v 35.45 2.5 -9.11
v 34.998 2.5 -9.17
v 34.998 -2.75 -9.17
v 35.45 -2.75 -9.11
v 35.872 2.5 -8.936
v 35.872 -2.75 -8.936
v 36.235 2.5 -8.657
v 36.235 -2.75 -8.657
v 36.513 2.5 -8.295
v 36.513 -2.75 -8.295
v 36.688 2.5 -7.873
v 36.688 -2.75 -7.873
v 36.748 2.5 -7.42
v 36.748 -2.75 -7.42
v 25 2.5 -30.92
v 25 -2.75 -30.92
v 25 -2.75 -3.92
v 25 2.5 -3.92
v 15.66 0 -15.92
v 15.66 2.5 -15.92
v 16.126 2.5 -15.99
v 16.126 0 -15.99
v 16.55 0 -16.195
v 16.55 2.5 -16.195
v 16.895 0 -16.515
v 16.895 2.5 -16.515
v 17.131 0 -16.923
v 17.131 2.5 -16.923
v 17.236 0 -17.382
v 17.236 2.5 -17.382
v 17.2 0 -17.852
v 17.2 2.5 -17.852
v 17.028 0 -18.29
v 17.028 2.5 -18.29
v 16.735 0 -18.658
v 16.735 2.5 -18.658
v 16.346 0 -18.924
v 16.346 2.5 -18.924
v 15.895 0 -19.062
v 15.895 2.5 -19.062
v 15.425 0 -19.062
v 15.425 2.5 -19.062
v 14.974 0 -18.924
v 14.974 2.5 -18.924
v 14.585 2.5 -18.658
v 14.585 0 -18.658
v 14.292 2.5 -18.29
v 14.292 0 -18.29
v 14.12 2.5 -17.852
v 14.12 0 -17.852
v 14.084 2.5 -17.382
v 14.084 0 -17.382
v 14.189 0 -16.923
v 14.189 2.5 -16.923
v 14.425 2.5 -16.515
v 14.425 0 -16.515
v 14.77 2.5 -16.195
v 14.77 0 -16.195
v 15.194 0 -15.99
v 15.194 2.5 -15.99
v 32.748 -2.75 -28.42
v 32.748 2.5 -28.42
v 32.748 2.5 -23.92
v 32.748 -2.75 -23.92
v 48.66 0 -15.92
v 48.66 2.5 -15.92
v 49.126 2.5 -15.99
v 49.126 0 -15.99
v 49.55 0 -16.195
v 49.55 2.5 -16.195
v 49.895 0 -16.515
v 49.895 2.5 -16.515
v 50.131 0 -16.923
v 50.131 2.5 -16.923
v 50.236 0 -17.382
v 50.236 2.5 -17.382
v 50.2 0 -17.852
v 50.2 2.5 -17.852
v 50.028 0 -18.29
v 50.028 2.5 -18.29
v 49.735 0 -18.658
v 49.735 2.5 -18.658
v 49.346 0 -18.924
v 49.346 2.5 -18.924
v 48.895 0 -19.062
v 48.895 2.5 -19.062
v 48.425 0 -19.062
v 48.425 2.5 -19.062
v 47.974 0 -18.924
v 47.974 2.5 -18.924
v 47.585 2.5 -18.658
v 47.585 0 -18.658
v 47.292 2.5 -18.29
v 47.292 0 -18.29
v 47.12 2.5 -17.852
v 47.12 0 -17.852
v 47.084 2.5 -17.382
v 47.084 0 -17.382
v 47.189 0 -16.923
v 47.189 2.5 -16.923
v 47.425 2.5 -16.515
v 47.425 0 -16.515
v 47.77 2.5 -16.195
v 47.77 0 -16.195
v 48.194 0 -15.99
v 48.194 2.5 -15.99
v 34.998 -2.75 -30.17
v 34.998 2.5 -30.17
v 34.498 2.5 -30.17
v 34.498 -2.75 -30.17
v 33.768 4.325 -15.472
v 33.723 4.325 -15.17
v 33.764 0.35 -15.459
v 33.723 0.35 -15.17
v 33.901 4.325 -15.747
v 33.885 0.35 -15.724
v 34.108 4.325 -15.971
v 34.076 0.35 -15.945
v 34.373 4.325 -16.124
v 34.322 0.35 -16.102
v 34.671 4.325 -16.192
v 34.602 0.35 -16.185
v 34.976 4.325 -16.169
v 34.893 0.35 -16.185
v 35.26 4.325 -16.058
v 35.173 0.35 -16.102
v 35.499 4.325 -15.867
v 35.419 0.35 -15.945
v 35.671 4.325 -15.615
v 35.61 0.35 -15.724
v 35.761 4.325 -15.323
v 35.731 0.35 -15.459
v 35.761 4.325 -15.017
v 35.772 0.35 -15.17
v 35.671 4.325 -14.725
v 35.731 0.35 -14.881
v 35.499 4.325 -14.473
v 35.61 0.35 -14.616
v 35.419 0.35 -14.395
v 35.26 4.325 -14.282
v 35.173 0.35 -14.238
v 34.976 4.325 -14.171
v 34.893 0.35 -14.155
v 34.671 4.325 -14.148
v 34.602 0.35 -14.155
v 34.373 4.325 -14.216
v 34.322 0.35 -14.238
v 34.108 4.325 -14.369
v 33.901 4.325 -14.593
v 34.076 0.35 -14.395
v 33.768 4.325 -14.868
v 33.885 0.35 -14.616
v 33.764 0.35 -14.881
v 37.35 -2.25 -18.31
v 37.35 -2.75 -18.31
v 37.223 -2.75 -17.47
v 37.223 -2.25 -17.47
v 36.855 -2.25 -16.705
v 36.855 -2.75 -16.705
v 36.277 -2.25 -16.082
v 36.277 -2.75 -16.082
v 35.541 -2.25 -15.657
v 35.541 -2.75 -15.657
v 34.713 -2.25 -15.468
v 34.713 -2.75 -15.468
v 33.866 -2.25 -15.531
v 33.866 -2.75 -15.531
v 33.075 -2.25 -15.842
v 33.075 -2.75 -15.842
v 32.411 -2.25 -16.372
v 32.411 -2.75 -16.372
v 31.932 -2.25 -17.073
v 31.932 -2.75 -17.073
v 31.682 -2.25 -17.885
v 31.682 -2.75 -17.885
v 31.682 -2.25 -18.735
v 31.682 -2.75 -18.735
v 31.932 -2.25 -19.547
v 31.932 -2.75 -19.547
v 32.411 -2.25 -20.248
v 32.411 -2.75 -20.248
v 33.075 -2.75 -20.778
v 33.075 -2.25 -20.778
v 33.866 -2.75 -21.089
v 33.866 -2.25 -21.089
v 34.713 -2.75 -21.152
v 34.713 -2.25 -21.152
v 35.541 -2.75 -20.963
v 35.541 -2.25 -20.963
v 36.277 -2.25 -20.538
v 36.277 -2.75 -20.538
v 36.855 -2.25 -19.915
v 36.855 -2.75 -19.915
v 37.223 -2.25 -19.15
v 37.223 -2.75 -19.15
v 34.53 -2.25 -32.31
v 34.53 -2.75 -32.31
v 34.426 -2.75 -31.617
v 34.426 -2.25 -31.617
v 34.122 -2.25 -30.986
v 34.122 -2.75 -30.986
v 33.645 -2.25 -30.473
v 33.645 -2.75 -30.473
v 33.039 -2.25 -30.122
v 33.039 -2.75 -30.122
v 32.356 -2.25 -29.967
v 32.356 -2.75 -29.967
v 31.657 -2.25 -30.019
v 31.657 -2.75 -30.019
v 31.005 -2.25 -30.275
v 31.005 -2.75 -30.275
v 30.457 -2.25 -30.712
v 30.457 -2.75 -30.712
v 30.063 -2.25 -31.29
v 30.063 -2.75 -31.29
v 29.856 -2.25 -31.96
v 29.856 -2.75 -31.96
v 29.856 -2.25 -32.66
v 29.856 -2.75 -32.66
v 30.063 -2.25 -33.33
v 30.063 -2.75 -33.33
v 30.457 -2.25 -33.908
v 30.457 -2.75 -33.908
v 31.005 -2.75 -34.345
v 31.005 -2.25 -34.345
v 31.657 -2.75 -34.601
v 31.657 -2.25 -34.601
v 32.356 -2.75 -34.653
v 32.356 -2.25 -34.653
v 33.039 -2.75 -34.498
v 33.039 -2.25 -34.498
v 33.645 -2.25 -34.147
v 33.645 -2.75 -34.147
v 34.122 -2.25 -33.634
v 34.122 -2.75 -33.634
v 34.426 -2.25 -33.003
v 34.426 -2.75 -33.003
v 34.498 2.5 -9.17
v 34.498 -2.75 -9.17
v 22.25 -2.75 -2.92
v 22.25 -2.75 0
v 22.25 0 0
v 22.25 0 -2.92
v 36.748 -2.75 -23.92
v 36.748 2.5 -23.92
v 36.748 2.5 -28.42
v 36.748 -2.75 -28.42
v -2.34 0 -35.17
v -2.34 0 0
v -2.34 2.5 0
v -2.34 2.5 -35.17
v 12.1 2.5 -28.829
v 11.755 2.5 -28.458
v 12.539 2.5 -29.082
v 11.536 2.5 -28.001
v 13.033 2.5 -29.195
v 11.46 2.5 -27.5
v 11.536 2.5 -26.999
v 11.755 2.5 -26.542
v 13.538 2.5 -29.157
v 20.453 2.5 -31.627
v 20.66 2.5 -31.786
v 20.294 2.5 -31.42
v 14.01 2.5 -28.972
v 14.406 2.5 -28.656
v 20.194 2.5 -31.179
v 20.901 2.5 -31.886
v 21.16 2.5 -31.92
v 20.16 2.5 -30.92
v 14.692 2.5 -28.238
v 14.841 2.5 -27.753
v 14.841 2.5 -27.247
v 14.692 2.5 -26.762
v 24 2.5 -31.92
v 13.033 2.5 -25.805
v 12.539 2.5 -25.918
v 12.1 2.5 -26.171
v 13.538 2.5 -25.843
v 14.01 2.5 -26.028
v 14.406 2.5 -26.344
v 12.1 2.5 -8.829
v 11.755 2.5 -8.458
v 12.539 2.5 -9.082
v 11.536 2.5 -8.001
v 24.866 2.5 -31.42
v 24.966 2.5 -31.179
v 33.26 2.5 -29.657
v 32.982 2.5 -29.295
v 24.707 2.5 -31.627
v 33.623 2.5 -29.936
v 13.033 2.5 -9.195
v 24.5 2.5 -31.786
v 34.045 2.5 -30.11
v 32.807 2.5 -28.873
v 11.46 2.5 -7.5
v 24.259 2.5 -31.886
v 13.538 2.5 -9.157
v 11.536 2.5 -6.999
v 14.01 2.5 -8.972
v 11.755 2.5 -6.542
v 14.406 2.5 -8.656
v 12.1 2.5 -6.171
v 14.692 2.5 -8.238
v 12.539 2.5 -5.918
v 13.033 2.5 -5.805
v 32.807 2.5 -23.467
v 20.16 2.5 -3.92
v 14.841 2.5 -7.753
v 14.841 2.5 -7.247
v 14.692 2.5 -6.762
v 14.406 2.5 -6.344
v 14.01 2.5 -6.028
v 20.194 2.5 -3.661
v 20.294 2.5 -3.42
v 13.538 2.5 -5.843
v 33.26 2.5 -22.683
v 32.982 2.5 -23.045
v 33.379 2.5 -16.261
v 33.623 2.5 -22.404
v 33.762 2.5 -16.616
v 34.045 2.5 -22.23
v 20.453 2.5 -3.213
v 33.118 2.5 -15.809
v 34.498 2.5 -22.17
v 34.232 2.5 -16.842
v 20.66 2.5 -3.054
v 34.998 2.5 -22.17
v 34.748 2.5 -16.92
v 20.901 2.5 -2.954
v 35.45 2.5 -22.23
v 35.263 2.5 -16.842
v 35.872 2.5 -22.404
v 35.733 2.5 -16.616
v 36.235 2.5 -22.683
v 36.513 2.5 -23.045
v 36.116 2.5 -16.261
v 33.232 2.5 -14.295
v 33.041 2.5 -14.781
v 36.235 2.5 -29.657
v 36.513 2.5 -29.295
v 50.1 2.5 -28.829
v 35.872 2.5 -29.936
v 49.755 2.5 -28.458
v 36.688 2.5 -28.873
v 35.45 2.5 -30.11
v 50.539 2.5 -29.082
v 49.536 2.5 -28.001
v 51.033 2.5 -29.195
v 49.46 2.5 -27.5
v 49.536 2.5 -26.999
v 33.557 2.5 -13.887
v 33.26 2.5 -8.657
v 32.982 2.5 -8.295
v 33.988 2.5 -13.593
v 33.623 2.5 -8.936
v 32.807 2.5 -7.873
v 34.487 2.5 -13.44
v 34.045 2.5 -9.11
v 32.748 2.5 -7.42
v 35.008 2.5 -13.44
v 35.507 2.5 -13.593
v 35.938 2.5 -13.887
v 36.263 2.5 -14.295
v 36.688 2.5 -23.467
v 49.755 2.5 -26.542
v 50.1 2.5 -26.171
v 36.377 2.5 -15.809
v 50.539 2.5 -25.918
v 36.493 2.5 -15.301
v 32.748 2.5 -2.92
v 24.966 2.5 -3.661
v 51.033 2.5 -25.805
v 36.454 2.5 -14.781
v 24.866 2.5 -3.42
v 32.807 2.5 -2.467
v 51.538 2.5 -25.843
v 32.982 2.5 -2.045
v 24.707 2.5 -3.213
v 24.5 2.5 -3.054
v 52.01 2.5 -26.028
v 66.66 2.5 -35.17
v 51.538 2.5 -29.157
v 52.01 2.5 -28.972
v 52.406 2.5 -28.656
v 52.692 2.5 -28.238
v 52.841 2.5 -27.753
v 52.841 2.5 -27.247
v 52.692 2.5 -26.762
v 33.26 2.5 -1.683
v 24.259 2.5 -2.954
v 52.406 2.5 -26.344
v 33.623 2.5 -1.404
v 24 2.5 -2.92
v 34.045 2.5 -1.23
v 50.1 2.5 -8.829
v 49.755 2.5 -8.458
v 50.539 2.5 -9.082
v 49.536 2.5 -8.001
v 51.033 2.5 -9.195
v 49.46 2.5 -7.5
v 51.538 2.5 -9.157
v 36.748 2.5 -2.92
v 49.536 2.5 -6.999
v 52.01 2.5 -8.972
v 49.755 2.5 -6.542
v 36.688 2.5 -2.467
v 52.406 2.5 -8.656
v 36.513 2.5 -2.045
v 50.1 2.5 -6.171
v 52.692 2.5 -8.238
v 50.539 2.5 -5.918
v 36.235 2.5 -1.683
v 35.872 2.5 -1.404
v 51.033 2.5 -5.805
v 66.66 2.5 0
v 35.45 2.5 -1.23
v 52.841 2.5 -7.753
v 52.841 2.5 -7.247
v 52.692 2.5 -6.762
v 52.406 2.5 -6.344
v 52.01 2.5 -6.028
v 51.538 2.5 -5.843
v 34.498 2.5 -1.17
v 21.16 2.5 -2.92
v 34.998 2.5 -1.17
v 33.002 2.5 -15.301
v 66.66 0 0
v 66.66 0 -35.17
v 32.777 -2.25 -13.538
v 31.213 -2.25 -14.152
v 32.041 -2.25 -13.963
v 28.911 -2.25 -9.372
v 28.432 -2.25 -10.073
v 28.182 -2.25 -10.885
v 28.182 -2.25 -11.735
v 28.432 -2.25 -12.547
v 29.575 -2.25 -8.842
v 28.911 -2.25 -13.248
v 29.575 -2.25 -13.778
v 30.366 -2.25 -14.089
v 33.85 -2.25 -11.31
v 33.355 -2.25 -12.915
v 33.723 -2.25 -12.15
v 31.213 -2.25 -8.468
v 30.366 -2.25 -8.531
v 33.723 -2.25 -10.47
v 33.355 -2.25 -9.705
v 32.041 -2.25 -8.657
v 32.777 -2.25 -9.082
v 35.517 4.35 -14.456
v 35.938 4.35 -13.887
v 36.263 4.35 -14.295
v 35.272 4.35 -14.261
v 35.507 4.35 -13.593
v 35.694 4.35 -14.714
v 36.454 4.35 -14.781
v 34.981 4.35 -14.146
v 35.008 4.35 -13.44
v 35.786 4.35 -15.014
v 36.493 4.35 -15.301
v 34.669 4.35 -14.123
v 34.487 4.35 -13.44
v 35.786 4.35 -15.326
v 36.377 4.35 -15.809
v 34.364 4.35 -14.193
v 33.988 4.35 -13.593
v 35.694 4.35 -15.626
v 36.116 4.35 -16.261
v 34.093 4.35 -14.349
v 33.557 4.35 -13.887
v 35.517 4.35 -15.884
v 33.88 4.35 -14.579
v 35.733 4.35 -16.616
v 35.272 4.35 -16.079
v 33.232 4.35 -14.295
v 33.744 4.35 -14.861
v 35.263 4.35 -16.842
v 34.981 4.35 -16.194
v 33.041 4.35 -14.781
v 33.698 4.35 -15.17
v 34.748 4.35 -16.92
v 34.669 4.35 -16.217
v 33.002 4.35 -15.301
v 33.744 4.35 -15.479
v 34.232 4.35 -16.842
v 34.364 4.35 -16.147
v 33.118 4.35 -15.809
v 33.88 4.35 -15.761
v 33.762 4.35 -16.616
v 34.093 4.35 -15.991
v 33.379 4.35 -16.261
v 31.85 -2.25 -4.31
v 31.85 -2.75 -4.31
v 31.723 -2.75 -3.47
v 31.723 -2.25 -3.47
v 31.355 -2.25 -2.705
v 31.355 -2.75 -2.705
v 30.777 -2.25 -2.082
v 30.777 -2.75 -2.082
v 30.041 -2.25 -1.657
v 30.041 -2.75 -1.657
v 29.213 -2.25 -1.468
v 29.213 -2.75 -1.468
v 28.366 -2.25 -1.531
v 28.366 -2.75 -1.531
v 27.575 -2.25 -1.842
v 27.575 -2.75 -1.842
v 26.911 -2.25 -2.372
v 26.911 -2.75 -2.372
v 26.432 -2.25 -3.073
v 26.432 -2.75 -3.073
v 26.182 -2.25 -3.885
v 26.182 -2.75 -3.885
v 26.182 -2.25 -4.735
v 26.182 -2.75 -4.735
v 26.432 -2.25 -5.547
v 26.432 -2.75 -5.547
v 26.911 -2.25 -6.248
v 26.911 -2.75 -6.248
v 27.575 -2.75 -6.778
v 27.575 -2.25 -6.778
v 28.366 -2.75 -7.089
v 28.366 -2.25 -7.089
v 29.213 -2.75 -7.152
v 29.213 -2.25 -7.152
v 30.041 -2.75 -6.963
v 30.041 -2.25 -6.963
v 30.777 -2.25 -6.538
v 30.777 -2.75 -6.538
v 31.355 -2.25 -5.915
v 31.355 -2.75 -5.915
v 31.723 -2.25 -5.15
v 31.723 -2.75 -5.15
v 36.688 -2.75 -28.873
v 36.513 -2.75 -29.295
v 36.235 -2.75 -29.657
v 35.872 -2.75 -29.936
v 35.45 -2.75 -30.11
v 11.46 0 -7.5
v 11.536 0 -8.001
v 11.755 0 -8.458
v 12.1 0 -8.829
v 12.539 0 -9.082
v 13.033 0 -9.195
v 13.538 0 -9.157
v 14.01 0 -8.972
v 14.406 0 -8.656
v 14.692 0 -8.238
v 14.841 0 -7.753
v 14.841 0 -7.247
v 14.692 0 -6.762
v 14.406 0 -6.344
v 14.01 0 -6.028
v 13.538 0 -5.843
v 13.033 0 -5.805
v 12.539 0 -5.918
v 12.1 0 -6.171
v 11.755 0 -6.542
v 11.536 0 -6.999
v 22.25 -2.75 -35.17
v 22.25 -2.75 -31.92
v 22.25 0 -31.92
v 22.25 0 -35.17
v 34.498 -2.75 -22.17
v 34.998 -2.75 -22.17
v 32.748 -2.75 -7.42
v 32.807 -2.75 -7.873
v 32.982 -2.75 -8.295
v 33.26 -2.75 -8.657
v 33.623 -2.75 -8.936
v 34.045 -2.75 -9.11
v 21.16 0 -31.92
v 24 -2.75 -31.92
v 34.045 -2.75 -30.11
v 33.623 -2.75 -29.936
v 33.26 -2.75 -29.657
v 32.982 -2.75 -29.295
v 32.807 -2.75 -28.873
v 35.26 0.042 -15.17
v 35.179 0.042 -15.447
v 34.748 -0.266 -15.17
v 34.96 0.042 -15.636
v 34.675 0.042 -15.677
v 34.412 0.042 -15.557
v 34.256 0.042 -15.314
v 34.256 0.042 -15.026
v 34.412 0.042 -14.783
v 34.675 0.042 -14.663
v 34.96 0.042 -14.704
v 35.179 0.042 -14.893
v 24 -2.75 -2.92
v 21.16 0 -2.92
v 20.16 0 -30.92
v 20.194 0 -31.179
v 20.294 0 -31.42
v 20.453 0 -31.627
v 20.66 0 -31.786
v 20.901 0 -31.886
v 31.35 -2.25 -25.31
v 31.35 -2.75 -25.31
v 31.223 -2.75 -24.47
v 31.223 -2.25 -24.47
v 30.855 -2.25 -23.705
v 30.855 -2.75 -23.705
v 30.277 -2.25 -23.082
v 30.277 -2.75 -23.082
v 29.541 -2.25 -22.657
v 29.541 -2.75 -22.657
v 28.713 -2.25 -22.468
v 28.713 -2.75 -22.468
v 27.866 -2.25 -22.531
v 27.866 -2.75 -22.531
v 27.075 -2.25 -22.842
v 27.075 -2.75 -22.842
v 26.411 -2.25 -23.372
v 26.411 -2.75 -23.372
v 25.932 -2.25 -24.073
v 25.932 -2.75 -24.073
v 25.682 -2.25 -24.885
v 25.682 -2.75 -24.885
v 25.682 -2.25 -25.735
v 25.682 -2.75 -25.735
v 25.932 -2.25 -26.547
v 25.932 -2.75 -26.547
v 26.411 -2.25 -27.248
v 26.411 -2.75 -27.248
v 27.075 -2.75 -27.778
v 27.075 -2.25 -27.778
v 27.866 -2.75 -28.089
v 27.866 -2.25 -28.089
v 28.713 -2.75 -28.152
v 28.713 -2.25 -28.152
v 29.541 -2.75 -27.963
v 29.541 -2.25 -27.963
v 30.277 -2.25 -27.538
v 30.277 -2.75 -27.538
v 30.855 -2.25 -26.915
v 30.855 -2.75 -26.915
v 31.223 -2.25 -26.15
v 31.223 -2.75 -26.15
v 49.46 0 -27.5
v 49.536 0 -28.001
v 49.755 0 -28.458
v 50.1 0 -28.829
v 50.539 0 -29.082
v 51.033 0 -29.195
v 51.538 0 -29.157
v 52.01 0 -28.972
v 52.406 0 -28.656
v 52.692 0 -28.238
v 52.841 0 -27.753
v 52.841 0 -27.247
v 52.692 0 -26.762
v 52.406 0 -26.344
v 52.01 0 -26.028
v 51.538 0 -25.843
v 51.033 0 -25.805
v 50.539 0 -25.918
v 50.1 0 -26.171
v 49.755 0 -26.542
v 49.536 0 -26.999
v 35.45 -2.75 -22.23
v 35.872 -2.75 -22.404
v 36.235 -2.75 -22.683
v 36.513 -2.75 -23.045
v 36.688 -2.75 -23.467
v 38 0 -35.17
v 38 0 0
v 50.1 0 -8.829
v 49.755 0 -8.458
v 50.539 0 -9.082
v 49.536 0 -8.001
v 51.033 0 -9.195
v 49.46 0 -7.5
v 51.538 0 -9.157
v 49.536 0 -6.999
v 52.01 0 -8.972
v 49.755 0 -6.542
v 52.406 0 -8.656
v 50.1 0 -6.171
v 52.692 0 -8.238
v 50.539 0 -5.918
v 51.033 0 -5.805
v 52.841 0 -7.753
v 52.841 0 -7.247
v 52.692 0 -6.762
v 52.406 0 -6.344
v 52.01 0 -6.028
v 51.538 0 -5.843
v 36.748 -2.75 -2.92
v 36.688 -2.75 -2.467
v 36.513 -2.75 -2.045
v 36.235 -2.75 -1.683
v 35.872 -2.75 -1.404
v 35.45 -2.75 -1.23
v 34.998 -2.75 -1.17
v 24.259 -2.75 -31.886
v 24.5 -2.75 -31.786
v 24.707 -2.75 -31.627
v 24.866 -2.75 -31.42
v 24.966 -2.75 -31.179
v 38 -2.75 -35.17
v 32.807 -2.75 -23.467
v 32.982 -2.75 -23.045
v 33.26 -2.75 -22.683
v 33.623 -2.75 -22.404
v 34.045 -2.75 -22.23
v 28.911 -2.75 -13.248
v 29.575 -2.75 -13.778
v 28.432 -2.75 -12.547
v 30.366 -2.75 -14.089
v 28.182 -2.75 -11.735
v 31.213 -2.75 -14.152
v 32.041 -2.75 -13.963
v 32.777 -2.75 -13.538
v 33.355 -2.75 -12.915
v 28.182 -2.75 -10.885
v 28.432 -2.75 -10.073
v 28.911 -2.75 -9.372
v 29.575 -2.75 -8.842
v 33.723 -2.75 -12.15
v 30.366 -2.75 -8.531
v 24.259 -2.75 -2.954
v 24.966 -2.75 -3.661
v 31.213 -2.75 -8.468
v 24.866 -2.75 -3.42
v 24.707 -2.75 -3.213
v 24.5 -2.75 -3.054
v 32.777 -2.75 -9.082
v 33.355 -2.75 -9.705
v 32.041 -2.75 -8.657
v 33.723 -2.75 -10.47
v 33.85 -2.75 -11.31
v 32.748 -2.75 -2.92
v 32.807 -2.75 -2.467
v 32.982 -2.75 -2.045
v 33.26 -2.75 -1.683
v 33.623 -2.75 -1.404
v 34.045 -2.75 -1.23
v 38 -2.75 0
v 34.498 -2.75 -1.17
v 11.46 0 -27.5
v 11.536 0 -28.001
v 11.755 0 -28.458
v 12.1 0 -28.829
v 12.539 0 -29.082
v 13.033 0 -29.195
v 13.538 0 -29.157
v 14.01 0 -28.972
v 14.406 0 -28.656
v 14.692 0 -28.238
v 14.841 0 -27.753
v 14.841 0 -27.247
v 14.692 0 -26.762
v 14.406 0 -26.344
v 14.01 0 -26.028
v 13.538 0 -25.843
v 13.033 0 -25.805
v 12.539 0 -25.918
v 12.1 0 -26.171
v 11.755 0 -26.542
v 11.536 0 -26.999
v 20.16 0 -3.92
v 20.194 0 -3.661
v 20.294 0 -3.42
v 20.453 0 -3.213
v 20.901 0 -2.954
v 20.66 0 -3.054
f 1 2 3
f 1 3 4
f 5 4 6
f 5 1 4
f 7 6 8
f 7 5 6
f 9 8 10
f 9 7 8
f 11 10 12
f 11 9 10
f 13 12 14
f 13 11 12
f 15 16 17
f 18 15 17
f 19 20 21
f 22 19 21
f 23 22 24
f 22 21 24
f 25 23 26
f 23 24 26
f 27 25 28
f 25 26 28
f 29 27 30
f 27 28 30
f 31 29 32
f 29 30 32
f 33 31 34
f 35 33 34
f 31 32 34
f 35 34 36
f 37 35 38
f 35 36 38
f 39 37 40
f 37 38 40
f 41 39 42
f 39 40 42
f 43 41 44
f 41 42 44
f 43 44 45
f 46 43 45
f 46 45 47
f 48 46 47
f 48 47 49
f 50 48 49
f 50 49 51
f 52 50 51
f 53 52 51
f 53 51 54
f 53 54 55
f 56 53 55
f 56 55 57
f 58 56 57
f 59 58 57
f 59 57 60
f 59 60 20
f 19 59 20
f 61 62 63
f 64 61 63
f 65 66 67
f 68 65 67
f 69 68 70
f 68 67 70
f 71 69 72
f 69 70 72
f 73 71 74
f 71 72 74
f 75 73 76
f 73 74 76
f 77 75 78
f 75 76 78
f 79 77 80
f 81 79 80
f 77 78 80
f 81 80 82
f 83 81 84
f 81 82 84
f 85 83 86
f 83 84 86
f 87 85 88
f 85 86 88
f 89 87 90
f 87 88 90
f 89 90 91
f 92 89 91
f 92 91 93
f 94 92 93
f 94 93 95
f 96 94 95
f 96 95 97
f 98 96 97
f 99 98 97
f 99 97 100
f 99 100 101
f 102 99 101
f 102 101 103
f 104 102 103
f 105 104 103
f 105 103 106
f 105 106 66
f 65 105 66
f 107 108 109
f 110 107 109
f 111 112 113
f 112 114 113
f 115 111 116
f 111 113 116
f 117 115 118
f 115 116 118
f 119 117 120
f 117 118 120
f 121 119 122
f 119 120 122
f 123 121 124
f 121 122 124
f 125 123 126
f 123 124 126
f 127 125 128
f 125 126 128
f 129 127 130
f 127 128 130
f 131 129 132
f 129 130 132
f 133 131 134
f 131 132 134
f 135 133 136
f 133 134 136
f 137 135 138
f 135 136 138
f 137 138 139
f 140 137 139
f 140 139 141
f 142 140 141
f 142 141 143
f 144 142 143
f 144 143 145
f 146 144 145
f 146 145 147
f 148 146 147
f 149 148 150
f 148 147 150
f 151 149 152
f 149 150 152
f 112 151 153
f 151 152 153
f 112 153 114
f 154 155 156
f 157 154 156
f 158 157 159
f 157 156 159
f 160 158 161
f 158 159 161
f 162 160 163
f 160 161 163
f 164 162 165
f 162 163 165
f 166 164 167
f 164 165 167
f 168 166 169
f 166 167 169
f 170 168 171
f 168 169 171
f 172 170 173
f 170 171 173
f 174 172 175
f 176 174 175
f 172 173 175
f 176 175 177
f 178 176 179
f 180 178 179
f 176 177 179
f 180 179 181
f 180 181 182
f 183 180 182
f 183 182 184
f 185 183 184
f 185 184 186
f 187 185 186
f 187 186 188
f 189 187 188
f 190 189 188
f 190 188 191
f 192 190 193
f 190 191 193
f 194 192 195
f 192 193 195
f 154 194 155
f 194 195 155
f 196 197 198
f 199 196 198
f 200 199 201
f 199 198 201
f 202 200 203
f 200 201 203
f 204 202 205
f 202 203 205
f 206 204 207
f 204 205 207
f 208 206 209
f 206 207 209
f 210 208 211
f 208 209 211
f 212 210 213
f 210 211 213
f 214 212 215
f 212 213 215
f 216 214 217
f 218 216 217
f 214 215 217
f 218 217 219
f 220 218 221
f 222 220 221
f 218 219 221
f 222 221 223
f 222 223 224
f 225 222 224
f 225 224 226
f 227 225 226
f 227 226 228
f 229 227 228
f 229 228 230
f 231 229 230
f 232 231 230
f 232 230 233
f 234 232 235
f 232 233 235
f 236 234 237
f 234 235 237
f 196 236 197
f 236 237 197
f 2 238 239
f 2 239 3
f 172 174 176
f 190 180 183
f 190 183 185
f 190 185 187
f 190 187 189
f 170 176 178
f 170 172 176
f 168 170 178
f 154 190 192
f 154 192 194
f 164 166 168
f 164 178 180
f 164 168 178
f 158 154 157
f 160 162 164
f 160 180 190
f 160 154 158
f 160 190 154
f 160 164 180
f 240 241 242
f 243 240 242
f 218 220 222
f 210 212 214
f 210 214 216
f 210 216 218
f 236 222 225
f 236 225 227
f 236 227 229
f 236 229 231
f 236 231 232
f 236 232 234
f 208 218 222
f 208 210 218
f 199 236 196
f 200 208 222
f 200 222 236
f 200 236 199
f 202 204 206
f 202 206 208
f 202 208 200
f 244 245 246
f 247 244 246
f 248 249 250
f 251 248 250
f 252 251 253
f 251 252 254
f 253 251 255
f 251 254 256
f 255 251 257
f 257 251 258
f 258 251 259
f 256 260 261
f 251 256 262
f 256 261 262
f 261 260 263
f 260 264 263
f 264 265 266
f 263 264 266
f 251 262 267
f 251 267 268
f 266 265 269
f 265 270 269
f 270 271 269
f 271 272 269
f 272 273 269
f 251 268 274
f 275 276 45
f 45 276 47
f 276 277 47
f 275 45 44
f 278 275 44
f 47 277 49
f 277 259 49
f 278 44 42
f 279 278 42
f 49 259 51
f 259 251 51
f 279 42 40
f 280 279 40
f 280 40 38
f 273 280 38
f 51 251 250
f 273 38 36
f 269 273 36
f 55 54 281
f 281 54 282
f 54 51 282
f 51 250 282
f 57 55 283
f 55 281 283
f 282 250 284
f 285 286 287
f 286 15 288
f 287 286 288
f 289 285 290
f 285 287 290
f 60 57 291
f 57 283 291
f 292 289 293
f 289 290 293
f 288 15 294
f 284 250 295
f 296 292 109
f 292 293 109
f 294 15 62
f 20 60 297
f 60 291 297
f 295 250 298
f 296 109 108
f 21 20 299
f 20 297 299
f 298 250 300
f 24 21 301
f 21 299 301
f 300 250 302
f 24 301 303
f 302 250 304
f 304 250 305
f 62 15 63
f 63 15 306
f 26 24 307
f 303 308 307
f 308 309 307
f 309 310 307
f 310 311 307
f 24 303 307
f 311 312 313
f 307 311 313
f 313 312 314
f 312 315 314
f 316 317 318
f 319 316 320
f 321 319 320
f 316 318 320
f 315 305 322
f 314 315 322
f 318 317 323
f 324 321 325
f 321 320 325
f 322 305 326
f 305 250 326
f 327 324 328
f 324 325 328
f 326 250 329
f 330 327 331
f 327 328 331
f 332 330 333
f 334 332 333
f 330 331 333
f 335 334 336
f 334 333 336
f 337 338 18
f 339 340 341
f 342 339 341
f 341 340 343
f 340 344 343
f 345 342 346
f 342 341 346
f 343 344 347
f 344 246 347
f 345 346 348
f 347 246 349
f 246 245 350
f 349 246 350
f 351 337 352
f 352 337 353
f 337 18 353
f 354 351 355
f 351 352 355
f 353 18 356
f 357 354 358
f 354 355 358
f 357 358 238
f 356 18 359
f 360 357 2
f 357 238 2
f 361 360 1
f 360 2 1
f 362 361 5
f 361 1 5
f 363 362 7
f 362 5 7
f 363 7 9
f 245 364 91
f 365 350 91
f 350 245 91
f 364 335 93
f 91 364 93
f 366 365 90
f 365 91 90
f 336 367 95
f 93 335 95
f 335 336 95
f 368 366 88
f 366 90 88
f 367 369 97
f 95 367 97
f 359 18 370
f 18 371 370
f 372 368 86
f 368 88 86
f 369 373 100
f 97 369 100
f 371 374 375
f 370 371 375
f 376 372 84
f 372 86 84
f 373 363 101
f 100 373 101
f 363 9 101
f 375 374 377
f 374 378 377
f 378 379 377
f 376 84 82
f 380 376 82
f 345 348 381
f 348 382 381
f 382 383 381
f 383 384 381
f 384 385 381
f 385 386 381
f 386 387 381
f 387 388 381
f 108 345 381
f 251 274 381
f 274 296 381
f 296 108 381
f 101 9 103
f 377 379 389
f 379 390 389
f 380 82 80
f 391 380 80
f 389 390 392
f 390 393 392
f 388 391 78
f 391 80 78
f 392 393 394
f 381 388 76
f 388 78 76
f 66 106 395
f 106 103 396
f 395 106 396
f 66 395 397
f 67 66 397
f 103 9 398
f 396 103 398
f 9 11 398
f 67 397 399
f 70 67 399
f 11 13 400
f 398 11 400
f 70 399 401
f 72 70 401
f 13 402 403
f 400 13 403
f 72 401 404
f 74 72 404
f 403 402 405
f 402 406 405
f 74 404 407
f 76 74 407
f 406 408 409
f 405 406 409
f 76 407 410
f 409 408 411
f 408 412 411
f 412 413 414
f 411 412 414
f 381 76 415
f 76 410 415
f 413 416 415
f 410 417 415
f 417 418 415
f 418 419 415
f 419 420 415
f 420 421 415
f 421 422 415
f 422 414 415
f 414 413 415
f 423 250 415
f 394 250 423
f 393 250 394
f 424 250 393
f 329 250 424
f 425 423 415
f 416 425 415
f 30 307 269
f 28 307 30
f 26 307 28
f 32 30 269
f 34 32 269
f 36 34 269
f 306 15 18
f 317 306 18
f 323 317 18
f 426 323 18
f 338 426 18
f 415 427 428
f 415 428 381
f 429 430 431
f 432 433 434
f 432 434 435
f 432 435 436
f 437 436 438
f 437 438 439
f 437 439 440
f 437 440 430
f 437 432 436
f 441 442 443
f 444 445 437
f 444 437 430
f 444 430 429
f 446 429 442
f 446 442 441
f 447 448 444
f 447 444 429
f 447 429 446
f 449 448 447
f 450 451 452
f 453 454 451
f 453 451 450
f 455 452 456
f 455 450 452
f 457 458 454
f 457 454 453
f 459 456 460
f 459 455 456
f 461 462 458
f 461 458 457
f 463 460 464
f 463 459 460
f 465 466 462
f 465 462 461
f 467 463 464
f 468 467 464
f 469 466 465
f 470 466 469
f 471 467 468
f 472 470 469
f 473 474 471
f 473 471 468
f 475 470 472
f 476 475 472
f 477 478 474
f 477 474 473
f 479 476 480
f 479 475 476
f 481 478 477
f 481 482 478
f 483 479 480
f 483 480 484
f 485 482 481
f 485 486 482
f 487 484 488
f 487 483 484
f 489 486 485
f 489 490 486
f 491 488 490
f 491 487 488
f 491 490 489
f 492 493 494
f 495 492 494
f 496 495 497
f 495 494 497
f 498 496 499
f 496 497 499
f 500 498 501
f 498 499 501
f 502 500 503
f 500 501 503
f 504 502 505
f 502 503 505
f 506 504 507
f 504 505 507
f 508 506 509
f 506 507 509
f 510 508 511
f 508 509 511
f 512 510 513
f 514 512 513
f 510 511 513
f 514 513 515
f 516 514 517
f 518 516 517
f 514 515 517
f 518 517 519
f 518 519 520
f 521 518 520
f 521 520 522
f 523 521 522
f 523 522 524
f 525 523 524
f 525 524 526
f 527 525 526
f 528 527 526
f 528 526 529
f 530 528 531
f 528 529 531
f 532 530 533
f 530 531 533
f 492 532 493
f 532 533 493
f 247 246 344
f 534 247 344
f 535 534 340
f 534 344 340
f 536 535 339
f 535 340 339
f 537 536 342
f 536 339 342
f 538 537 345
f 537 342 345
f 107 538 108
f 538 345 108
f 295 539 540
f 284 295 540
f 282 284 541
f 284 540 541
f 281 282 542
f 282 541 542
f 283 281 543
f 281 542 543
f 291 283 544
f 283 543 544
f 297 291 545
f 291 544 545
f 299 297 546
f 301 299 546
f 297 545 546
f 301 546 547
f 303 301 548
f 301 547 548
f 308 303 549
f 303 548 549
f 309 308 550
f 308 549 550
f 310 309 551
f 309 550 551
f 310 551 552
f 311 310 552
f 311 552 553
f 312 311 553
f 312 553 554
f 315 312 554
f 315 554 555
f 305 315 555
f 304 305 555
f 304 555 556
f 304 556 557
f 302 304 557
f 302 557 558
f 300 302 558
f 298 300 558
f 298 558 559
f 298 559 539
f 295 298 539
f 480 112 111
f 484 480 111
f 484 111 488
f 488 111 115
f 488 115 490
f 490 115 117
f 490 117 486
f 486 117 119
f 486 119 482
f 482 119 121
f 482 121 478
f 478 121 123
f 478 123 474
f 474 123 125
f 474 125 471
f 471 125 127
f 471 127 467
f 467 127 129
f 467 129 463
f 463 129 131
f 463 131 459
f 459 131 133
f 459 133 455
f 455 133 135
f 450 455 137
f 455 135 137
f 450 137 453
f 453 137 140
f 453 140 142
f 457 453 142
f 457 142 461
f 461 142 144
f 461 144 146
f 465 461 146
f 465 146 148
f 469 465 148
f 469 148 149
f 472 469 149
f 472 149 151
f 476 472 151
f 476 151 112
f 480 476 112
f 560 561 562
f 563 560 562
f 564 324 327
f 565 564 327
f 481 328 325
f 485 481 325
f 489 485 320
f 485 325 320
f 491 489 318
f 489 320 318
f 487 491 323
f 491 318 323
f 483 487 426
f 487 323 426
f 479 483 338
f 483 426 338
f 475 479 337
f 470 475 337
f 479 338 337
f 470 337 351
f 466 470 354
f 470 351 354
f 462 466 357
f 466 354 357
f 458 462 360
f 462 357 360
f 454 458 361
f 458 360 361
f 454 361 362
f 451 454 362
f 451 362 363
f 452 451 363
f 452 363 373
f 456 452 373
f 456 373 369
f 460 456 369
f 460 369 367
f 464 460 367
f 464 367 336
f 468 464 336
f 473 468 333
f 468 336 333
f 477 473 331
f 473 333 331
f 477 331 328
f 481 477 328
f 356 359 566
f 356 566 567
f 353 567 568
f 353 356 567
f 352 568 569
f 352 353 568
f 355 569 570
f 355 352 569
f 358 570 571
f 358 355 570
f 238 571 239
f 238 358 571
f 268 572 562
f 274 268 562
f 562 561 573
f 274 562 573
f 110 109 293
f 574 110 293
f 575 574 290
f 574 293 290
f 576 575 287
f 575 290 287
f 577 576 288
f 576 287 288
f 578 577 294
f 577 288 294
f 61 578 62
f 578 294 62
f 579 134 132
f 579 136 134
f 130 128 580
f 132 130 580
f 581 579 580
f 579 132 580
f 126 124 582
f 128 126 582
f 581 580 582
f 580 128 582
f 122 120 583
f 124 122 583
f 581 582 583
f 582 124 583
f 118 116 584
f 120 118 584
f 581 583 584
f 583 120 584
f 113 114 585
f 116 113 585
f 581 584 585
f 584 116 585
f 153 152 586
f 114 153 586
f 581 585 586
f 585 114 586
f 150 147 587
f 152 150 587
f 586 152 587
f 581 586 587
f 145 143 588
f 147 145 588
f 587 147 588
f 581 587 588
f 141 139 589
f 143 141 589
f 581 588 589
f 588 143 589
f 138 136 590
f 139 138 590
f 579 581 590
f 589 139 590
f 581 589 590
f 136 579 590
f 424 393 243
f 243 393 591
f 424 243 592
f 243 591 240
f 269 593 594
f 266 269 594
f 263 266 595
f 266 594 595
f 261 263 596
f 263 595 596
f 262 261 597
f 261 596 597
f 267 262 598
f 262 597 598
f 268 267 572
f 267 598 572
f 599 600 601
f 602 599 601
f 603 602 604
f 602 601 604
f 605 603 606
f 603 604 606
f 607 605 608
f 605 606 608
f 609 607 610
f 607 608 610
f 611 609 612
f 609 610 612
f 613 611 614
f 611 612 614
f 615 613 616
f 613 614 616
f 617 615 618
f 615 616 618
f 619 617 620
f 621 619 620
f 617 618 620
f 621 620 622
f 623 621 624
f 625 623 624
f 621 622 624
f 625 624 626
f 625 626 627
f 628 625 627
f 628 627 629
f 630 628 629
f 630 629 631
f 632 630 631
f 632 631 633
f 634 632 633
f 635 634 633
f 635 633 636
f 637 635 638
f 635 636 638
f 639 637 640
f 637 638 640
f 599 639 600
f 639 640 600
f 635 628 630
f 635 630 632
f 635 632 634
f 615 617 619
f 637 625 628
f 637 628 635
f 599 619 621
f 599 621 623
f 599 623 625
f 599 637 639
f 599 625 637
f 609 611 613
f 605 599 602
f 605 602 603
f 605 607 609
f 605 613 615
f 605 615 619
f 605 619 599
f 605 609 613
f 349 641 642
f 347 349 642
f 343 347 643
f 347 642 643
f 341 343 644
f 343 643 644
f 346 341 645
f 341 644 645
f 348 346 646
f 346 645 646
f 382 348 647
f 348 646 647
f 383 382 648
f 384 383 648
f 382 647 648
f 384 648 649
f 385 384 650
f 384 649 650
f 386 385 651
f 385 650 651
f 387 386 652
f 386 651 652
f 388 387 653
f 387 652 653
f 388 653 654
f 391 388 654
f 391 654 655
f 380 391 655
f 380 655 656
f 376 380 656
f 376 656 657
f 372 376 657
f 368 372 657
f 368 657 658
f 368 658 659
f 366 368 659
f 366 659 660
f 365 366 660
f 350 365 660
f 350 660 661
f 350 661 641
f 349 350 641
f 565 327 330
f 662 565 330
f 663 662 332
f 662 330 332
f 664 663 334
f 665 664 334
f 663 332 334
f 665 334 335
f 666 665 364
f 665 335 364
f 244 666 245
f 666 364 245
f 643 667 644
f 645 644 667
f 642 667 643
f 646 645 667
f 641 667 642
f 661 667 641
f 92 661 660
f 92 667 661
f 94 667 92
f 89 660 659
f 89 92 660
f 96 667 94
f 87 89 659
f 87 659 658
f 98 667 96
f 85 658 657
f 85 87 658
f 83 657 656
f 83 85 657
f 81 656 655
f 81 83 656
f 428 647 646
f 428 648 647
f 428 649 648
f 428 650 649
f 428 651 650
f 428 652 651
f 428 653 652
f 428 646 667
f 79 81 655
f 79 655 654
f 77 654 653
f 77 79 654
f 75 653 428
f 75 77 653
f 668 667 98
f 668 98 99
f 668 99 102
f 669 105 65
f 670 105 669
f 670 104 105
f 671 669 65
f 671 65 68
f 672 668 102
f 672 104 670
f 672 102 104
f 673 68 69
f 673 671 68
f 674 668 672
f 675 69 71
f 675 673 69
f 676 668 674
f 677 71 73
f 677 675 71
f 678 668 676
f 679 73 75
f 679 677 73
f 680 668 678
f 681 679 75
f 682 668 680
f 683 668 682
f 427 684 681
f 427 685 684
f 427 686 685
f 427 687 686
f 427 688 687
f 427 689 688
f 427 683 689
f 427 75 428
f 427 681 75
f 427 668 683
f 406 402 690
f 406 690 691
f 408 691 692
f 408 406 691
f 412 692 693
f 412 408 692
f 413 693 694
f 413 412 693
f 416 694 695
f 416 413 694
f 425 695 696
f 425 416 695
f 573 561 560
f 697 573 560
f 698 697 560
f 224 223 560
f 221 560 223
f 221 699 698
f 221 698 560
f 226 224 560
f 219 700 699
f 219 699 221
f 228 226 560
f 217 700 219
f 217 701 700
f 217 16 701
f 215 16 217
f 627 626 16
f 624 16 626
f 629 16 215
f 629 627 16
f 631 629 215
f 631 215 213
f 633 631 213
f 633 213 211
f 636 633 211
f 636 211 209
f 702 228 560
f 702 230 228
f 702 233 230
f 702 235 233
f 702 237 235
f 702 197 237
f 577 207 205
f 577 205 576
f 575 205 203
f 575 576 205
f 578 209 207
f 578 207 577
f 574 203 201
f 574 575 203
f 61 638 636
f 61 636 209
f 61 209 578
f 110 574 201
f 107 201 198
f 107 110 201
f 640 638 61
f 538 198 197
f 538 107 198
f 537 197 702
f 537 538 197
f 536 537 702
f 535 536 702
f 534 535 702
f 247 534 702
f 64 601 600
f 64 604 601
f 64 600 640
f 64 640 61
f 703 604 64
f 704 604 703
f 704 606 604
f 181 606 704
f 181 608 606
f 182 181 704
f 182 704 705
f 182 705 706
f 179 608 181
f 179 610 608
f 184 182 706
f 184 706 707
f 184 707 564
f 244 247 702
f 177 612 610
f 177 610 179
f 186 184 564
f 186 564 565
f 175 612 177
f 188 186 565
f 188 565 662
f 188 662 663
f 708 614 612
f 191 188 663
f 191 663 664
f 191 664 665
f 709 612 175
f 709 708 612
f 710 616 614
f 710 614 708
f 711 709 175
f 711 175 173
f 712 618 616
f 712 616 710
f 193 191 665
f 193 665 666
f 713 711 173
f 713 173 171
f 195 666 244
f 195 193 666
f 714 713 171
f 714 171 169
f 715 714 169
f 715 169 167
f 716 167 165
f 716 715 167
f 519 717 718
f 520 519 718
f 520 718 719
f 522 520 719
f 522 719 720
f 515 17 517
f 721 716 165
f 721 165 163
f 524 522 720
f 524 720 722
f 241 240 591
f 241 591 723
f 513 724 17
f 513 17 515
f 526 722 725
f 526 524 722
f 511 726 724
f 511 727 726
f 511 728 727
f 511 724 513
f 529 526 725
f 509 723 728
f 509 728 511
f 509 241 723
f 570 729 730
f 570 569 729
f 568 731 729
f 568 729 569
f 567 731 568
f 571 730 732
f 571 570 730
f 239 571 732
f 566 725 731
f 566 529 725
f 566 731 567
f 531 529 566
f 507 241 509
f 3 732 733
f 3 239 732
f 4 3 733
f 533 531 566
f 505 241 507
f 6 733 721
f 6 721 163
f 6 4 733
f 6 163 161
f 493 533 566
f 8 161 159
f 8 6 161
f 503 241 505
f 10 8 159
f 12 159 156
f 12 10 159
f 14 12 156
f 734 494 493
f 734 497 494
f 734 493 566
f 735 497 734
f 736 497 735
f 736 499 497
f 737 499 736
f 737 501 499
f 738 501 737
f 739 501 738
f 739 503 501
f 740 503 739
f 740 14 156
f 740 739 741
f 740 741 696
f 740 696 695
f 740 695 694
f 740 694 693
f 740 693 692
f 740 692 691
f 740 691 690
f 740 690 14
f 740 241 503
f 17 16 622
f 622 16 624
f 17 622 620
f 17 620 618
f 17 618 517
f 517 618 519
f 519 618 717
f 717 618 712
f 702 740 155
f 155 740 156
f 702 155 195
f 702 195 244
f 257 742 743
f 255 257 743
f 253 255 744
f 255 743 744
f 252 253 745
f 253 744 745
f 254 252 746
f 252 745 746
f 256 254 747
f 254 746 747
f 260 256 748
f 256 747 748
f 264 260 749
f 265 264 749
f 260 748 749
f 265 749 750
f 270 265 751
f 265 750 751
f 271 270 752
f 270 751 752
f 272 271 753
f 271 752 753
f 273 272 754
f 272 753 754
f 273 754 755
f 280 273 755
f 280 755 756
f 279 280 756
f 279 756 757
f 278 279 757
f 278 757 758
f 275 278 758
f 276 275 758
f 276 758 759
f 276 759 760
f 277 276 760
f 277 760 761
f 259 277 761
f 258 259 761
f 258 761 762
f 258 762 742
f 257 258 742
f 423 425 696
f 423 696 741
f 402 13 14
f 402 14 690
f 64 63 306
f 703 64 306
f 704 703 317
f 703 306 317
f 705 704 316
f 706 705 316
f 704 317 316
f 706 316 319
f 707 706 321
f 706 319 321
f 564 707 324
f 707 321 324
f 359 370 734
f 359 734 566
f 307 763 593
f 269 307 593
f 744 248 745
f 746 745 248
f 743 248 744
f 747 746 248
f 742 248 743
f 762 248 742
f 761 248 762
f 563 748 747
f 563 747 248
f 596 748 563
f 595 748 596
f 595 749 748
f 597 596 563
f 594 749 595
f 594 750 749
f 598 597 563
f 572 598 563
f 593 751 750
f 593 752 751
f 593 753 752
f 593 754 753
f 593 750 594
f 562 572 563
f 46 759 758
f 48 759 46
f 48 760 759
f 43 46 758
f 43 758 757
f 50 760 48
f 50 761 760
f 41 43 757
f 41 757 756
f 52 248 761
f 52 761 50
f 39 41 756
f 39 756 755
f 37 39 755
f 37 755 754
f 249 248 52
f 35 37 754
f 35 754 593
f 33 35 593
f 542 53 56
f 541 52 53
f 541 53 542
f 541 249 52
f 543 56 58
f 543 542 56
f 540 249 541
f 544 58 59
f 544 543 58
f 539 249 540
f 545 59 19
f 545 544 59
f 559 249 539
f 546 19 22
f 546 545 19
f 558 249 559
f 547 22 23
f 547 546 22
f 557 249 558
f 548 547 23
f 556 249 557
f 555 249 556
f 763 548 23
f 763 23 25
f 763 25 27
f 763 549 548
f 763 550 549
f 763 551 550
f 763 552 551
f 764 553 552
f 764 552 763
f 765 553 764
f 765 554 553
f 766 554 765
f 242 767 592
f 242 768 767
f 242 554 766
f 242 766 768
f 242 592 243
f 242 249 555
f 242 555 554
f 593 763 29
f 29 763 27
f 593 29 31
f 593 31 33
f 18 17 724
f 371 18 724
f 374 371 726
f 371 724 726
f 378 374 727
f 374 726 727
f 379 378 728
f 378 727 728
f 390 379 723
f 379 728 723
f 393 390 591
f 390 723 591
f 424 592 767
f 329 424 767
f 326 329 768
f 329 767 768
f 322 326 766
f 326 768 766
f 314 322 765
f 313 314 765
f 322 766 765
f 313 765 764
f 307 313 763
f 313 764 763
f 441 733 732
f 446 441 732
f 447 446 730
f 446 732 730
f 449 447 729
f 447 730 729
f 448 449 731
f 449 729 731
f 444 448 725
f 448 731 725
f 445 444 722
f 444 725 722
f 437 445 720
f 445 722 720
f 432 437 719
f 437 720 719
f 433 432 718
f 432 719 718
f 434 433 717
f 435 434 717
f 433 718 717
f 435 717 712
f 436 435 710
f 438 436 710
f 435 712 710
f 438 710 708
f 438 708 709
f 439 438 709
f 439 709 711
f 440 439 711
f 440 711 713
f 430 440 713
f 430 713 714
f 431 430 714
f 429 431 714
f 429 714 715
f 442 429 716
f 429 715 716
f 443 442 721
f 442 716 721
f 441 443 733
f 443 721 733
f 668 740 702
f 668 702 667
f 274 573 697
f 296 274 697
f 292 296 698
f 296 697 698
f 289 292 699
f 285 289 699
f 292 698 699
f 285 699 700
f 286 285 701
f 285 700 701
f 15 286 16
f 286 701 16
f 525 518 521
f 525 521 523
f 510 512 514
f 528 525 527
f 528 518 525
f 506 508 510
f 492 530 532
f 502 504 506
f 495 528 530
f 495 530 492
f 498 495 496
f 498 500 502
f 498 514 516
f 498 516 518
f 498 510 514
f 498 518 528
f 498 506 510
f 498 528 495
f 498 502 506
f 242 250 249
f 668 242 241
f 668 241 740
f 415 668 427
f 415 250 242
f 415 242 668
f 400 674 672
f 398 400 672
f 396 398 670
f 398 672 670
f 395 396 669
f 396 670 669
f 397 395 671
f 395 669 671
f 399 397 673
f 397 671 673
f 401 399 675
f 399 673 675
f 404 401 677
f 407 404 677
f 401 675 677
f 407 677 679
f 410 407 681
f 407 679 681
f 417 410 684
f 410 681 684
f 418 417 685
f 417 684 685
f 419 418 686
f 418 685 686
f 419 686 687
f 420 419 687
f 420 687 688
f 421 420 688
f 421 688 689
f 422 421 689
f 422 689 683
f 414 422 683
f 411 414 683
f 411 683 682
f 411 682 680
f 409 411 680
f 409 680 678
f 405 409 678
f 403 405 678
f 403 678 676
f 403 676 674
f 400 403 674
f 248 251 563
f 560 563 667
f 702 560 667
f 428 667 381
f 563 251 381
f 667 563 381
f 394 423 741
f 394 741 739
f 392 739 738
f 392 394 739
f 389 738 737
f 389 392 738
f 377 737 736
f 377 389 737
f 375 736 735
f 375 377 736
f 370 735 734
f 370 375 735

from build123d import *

# Parameters (mm, degrees)
SKETCH1_W                                = 60
SKETCH1_H                                = 35.17
BOSS_EXTRUDE1_DEPTH                      = 2.5
SKETCH2_W                                = 16.25
SKETCH2_H                                = 2.75
BOSS_EXTRUDE2_DEPTH                      = 35.17
CUT_EXTRUDE1_DEPTH                       = 70.745905973
CUT_EXTRUDE2_DEPTH                       = 70.745905973
SKETCH5_R                                = 1.75
BOSS_EXTRUDE3_DEPTH                      = 1.85
TAP_DRILL_FOR_M2_5X0_45_TAP1_D           = 2.05
TAP_DRILL_FOR_M2_5X0_45_TAP1_DEPTH       = 4
TAP_DRILL_FOR_M2_5X0_45_TAP1_CSINK_D     = 2.1
TAP_DRILL_FOR_M2_5X0_45_TAP1_CSINK_ANGLE = 90
TAP_DRILL_FOR_M2_5X0_45_TAP1_TIP         = 0.615882135
SKETCH14_R                               = 2.85
SKETCH14_R_2                             = 2.35
CUT_EXTRUDE4_DEPTH                       = 0.5
SKETCH15_W                               = 4.66
SKETCH15_H                               = 2.5
SKETCH15_W_2                             = 0.34
CUT_EXTRUDE5_DEPTH                       = 70.683939326
SKETCH9_R                                = 1.58
CUT_EXTRUDE3_DEPTH                       = 70.453632014
M3_CLEARANCE_HOLE1_D                     = 3.4
SKETCH17_W                               = 7
SKETCH17_H                               = 2.5
BOSS_EXTRUDE4_DEPTH                      = 35.17
SKETCH18_W                               = 0.25
SKETCH18_H                               = 2.75
CUT_EXTRUDE6_DEPTH                       = 76.494417012


with BuildPart() as part:
    # Sketch1 → Boss-Extrude1 (new body)
    with BuildSketch(Plane(origin=(0, 0, 0), x_dir=(1, 0, 0), z_dir=(0, 1, 0))):
        with Locations((30, 17.585)):
            Rectangle(SKETCH1_W, SKETCH1_H)
    extrude(amount=BOSS_EXTRUDE1_DEPTH)

    # Sketch2 → Boss-Extrude2 (add, through all)
    with BuildSketch(Plane.XY):
        with Locations((30.125, -1.375)):
            Rectangle(SKETCH2_W, SKETCH2_H)
    extrude(amount=-BOSS_EXTRUDE2_DEPTH)

    # Sketch3 → Cut-Extrude1 (cut, through all)
    with BuildSketch(Plane.XZ.offset(2.75)):
        with BuildLine():
            Line((21.16, -31.92), (24, -31.92))
            ThreePointArc((24, -31.92), (24.707106781, -31.627106781), (25, -30.92))
            Line((25, -30.92), (25, -3.92))
            ThreePointArc((25, -3.92), (24.707106781, -3.212893219), (24, -2.92))
            Line((24, -2.92), (21.16, -2.92))
            ThreePointArc((21.16, -2.92), (20.452893219, -3.212893219), (20.16, -3.92))
            Line((20.16, -3.92), (20.16, -30.92))
            ThreePointArc((20.16, -30.92), (20.452893219, -31.627106781), (21.16, -31.92))
        make_face()
    extrude(amount=-CUT_EXTRUDE1_DEPTH, mode=Mode.SUBTRACT)

    # Sketch4 → Cut-Extrude2 (cut, through all)
    with BuildSketch(Plane(origin=(0, 2.5, 0), x_dir=(1, 0, 0), z_dir=(0, 1, 0))):
        with BuildLine():
            Line((32.7475, 2.92), (32.7475, 7.42))
            ThreePointArc((32.7475, 7.42), (33.260063133, 8.657436867), (34.4975, 9.17))
            Line((34.4975, 9.17), (34.9975, 9.17))
            ThreePointArc((34.9975, 9.17), (36.234936867, 8.657436867), (36.7475, 7.42))
            Line((36.7475, 7.42), (36.7475, 2.92))
            ThreePointArc((36.7475, 2.92), (36.234936867, 1.682563133), (34.9975, 1.17))
            Line((34.9975, 1.17), (34.4975, 1.17))
            ThreePointArc((34.4975, 1.17), (33.260063133, 1.682563133), (32.7475, 2.92))
        make_face()
        with BuildLine():
            Line((32.7475, 28.42), (32.7475, 23.92))
            ThreePointArc((32.7475, 23.92), (33.260063133, 22.682563133), (34.4975, 22.17))
            Line((34.4975, 22.17), (34.9975, 22.17))
            ThreePointArc((34.9975, 22.17), (36.234936867, 22.682563133), (36.7475, 23.92))
            Line((36.7475, 23.92), (36.7475, 28.42))
            ThreePointArc((36.7475, 28.42), (36.234936867, 29.657436867), (34.9975, 30.17))
            Line((34.9975, 30.17), (34.4975, 30.17))
            ThreePointArc((34.4975, 30.17), (33.260063133, 29.657436867), (32.7475, 28.42))
        make_face()
    extrude(amount=-CUT_EXTRUDE2_DEPTH, mode=Mode.SUBTRACT)

    # Sketch5 → Boss-Extrude3 (add)
    with BuildSketch(Plane(origin=(0, 2.5, 0), x_dir=(1, 0, 0), z_dir=(0, 1, 0))):
        with Locations(Location((34.7475, 15.17, 0), (0, 0, 90))):
            Circle(SKETCH5_R)
    extrude(amount=BOSS_EXTRUDE3_DEPTH)

    # Tap Drill for M2.5x0.45 Tap1
    with Locations(Plane(origin=(0, 4.35, 0), x_dir=(1, 0, 0), z_dir=(0, 1, 0))):
        with Locations((34.7475, 15.17)):
            CounterSinkHole(TAP_DRILL_FOR_M2_5X0_45_TAP1_D / 2, TAP_DRILL_FOR_M2_5X0_45_TAP1_CSINK_D / 2, depth=TAP_DRILL_FOR_M2_5X0_45_TAP1_DEPTH, counter_sink_angle=TAP_DRILL_FOR_M2_5X0_45_TAP1_CSINK_ANGLE)
            with Locations((0, 0, -(TAP_DRILL_FOR_M2_5X0_45_TAP1_DEPTH + TAP_DRILL_FOR_M2_5X0_45_TAP1_TIP / 2))):  # 118° drill point
                Cone(0, TAP_DRILL_FOR_M2_5X0_45_TAP1_D / 2, TAP_DRILL_FOR_M2_5X0_45_TAP1_TIP, mode=Mode.SUBTRACT)

    # Sketch14 → Cut-Extrude4 (cut)
    with BuildSketch(Plane.XZ.offset(2.75)):
        with Locations((28.5, -25.31)):
            Circle(SKETCH14_R)
        with Locations((34.5, -18.31)):
            Circle(SKETCH14_R)
        with Locations((31, -11.31)):
            Circle(SKETCH14_R)
        with Locations((29, -4.31)):
            Circle(SKETCH14_R)
        with Locations((32.18, -32.31)):
            Circle(SKETCH14_R_2)
    extrude(amount=-CUT_EXTRUDE4_DEPTH, mode=Mode.SUBTRACT)

    # Sketch15 → Cut-Extrude5 (cut, through all)
    with BuildSketch(Plane(origin=(0, 0, -35.17), x_dir=(-1, 0, 0), z_dir=(0, 0, -1))):
        with Locations((-2.33, 1.25)):
            Rectangle(SKETCH15_W, SKETCH15_H)
        with Locations((-59.83, 1.25)):
            Rectangle(SKETCH15_W_2, SKETCH15_H)
    extrude(amount=-CUT_EXTRUDE5_DEPTH, mode=Mode.SUBTRACT)

    # Sketch9 → Cut-Extrude3 (cut, through all)
    with BuildSketch(Plane(origin=(0, 2.5, 0), x_dir=(1, 0, 0), z_dir=(0, 1, 0))):
        with Locations(Location((15.66, 17.5, 0), (0, 0, 270))):
            Circle(SKETCH9_R)
        with Locations(Location((48.66, 17.5, 0), (0, 0, 270))):
            Circle(SKETCH9_R)
    extrude(amount=-CUT_EXTRUDE3_DEPTH, mode=Mode.SUBTRACT)

    # M3 Clearance Hole1 (through all)
    with Locations(Plane(origin=(0, 2.5, 0), x_dir=(1, 0, 0), z_dir=(0, 1, 0))):
        with Locations((13.16, 7.5), (13.16, 27.5), (51.16, 27.5), (51.16, 7.5)):
            Hole(M3_CLEARANCE_HOLE1_D / 2)

    # Sketch17 → Boss-Extrude4 (add)
    with BuildSketch(Plane.XY):
        with Locations((63.16, 1.25)):
            Rectangle(SKETCH17_W, SKETCH17_H)
        with Locations((1.16, 1.25)):
            Rectangle(SKETCH17_W, SKETCH17_H)
    extrude(amount=-BOSS_EXTRUDE4_DEPTH)

    # Sketch18 → Cut-Extrude6 (cut, through all)
    with BuildSketch(Plane.XY):
        with Locations((38.125, -1.375)):
            Rectangle(SKETCH18_W, SKETCH18_H)
        with Locations((22.125, -1.375)):
            Rectangle(SKETCH18_W, SKETCH18_H)
    extrude(amount=-CUT_EXTRUDE6_DEPTH, mode=Mode.SUBTRACT)


solid = part.part
